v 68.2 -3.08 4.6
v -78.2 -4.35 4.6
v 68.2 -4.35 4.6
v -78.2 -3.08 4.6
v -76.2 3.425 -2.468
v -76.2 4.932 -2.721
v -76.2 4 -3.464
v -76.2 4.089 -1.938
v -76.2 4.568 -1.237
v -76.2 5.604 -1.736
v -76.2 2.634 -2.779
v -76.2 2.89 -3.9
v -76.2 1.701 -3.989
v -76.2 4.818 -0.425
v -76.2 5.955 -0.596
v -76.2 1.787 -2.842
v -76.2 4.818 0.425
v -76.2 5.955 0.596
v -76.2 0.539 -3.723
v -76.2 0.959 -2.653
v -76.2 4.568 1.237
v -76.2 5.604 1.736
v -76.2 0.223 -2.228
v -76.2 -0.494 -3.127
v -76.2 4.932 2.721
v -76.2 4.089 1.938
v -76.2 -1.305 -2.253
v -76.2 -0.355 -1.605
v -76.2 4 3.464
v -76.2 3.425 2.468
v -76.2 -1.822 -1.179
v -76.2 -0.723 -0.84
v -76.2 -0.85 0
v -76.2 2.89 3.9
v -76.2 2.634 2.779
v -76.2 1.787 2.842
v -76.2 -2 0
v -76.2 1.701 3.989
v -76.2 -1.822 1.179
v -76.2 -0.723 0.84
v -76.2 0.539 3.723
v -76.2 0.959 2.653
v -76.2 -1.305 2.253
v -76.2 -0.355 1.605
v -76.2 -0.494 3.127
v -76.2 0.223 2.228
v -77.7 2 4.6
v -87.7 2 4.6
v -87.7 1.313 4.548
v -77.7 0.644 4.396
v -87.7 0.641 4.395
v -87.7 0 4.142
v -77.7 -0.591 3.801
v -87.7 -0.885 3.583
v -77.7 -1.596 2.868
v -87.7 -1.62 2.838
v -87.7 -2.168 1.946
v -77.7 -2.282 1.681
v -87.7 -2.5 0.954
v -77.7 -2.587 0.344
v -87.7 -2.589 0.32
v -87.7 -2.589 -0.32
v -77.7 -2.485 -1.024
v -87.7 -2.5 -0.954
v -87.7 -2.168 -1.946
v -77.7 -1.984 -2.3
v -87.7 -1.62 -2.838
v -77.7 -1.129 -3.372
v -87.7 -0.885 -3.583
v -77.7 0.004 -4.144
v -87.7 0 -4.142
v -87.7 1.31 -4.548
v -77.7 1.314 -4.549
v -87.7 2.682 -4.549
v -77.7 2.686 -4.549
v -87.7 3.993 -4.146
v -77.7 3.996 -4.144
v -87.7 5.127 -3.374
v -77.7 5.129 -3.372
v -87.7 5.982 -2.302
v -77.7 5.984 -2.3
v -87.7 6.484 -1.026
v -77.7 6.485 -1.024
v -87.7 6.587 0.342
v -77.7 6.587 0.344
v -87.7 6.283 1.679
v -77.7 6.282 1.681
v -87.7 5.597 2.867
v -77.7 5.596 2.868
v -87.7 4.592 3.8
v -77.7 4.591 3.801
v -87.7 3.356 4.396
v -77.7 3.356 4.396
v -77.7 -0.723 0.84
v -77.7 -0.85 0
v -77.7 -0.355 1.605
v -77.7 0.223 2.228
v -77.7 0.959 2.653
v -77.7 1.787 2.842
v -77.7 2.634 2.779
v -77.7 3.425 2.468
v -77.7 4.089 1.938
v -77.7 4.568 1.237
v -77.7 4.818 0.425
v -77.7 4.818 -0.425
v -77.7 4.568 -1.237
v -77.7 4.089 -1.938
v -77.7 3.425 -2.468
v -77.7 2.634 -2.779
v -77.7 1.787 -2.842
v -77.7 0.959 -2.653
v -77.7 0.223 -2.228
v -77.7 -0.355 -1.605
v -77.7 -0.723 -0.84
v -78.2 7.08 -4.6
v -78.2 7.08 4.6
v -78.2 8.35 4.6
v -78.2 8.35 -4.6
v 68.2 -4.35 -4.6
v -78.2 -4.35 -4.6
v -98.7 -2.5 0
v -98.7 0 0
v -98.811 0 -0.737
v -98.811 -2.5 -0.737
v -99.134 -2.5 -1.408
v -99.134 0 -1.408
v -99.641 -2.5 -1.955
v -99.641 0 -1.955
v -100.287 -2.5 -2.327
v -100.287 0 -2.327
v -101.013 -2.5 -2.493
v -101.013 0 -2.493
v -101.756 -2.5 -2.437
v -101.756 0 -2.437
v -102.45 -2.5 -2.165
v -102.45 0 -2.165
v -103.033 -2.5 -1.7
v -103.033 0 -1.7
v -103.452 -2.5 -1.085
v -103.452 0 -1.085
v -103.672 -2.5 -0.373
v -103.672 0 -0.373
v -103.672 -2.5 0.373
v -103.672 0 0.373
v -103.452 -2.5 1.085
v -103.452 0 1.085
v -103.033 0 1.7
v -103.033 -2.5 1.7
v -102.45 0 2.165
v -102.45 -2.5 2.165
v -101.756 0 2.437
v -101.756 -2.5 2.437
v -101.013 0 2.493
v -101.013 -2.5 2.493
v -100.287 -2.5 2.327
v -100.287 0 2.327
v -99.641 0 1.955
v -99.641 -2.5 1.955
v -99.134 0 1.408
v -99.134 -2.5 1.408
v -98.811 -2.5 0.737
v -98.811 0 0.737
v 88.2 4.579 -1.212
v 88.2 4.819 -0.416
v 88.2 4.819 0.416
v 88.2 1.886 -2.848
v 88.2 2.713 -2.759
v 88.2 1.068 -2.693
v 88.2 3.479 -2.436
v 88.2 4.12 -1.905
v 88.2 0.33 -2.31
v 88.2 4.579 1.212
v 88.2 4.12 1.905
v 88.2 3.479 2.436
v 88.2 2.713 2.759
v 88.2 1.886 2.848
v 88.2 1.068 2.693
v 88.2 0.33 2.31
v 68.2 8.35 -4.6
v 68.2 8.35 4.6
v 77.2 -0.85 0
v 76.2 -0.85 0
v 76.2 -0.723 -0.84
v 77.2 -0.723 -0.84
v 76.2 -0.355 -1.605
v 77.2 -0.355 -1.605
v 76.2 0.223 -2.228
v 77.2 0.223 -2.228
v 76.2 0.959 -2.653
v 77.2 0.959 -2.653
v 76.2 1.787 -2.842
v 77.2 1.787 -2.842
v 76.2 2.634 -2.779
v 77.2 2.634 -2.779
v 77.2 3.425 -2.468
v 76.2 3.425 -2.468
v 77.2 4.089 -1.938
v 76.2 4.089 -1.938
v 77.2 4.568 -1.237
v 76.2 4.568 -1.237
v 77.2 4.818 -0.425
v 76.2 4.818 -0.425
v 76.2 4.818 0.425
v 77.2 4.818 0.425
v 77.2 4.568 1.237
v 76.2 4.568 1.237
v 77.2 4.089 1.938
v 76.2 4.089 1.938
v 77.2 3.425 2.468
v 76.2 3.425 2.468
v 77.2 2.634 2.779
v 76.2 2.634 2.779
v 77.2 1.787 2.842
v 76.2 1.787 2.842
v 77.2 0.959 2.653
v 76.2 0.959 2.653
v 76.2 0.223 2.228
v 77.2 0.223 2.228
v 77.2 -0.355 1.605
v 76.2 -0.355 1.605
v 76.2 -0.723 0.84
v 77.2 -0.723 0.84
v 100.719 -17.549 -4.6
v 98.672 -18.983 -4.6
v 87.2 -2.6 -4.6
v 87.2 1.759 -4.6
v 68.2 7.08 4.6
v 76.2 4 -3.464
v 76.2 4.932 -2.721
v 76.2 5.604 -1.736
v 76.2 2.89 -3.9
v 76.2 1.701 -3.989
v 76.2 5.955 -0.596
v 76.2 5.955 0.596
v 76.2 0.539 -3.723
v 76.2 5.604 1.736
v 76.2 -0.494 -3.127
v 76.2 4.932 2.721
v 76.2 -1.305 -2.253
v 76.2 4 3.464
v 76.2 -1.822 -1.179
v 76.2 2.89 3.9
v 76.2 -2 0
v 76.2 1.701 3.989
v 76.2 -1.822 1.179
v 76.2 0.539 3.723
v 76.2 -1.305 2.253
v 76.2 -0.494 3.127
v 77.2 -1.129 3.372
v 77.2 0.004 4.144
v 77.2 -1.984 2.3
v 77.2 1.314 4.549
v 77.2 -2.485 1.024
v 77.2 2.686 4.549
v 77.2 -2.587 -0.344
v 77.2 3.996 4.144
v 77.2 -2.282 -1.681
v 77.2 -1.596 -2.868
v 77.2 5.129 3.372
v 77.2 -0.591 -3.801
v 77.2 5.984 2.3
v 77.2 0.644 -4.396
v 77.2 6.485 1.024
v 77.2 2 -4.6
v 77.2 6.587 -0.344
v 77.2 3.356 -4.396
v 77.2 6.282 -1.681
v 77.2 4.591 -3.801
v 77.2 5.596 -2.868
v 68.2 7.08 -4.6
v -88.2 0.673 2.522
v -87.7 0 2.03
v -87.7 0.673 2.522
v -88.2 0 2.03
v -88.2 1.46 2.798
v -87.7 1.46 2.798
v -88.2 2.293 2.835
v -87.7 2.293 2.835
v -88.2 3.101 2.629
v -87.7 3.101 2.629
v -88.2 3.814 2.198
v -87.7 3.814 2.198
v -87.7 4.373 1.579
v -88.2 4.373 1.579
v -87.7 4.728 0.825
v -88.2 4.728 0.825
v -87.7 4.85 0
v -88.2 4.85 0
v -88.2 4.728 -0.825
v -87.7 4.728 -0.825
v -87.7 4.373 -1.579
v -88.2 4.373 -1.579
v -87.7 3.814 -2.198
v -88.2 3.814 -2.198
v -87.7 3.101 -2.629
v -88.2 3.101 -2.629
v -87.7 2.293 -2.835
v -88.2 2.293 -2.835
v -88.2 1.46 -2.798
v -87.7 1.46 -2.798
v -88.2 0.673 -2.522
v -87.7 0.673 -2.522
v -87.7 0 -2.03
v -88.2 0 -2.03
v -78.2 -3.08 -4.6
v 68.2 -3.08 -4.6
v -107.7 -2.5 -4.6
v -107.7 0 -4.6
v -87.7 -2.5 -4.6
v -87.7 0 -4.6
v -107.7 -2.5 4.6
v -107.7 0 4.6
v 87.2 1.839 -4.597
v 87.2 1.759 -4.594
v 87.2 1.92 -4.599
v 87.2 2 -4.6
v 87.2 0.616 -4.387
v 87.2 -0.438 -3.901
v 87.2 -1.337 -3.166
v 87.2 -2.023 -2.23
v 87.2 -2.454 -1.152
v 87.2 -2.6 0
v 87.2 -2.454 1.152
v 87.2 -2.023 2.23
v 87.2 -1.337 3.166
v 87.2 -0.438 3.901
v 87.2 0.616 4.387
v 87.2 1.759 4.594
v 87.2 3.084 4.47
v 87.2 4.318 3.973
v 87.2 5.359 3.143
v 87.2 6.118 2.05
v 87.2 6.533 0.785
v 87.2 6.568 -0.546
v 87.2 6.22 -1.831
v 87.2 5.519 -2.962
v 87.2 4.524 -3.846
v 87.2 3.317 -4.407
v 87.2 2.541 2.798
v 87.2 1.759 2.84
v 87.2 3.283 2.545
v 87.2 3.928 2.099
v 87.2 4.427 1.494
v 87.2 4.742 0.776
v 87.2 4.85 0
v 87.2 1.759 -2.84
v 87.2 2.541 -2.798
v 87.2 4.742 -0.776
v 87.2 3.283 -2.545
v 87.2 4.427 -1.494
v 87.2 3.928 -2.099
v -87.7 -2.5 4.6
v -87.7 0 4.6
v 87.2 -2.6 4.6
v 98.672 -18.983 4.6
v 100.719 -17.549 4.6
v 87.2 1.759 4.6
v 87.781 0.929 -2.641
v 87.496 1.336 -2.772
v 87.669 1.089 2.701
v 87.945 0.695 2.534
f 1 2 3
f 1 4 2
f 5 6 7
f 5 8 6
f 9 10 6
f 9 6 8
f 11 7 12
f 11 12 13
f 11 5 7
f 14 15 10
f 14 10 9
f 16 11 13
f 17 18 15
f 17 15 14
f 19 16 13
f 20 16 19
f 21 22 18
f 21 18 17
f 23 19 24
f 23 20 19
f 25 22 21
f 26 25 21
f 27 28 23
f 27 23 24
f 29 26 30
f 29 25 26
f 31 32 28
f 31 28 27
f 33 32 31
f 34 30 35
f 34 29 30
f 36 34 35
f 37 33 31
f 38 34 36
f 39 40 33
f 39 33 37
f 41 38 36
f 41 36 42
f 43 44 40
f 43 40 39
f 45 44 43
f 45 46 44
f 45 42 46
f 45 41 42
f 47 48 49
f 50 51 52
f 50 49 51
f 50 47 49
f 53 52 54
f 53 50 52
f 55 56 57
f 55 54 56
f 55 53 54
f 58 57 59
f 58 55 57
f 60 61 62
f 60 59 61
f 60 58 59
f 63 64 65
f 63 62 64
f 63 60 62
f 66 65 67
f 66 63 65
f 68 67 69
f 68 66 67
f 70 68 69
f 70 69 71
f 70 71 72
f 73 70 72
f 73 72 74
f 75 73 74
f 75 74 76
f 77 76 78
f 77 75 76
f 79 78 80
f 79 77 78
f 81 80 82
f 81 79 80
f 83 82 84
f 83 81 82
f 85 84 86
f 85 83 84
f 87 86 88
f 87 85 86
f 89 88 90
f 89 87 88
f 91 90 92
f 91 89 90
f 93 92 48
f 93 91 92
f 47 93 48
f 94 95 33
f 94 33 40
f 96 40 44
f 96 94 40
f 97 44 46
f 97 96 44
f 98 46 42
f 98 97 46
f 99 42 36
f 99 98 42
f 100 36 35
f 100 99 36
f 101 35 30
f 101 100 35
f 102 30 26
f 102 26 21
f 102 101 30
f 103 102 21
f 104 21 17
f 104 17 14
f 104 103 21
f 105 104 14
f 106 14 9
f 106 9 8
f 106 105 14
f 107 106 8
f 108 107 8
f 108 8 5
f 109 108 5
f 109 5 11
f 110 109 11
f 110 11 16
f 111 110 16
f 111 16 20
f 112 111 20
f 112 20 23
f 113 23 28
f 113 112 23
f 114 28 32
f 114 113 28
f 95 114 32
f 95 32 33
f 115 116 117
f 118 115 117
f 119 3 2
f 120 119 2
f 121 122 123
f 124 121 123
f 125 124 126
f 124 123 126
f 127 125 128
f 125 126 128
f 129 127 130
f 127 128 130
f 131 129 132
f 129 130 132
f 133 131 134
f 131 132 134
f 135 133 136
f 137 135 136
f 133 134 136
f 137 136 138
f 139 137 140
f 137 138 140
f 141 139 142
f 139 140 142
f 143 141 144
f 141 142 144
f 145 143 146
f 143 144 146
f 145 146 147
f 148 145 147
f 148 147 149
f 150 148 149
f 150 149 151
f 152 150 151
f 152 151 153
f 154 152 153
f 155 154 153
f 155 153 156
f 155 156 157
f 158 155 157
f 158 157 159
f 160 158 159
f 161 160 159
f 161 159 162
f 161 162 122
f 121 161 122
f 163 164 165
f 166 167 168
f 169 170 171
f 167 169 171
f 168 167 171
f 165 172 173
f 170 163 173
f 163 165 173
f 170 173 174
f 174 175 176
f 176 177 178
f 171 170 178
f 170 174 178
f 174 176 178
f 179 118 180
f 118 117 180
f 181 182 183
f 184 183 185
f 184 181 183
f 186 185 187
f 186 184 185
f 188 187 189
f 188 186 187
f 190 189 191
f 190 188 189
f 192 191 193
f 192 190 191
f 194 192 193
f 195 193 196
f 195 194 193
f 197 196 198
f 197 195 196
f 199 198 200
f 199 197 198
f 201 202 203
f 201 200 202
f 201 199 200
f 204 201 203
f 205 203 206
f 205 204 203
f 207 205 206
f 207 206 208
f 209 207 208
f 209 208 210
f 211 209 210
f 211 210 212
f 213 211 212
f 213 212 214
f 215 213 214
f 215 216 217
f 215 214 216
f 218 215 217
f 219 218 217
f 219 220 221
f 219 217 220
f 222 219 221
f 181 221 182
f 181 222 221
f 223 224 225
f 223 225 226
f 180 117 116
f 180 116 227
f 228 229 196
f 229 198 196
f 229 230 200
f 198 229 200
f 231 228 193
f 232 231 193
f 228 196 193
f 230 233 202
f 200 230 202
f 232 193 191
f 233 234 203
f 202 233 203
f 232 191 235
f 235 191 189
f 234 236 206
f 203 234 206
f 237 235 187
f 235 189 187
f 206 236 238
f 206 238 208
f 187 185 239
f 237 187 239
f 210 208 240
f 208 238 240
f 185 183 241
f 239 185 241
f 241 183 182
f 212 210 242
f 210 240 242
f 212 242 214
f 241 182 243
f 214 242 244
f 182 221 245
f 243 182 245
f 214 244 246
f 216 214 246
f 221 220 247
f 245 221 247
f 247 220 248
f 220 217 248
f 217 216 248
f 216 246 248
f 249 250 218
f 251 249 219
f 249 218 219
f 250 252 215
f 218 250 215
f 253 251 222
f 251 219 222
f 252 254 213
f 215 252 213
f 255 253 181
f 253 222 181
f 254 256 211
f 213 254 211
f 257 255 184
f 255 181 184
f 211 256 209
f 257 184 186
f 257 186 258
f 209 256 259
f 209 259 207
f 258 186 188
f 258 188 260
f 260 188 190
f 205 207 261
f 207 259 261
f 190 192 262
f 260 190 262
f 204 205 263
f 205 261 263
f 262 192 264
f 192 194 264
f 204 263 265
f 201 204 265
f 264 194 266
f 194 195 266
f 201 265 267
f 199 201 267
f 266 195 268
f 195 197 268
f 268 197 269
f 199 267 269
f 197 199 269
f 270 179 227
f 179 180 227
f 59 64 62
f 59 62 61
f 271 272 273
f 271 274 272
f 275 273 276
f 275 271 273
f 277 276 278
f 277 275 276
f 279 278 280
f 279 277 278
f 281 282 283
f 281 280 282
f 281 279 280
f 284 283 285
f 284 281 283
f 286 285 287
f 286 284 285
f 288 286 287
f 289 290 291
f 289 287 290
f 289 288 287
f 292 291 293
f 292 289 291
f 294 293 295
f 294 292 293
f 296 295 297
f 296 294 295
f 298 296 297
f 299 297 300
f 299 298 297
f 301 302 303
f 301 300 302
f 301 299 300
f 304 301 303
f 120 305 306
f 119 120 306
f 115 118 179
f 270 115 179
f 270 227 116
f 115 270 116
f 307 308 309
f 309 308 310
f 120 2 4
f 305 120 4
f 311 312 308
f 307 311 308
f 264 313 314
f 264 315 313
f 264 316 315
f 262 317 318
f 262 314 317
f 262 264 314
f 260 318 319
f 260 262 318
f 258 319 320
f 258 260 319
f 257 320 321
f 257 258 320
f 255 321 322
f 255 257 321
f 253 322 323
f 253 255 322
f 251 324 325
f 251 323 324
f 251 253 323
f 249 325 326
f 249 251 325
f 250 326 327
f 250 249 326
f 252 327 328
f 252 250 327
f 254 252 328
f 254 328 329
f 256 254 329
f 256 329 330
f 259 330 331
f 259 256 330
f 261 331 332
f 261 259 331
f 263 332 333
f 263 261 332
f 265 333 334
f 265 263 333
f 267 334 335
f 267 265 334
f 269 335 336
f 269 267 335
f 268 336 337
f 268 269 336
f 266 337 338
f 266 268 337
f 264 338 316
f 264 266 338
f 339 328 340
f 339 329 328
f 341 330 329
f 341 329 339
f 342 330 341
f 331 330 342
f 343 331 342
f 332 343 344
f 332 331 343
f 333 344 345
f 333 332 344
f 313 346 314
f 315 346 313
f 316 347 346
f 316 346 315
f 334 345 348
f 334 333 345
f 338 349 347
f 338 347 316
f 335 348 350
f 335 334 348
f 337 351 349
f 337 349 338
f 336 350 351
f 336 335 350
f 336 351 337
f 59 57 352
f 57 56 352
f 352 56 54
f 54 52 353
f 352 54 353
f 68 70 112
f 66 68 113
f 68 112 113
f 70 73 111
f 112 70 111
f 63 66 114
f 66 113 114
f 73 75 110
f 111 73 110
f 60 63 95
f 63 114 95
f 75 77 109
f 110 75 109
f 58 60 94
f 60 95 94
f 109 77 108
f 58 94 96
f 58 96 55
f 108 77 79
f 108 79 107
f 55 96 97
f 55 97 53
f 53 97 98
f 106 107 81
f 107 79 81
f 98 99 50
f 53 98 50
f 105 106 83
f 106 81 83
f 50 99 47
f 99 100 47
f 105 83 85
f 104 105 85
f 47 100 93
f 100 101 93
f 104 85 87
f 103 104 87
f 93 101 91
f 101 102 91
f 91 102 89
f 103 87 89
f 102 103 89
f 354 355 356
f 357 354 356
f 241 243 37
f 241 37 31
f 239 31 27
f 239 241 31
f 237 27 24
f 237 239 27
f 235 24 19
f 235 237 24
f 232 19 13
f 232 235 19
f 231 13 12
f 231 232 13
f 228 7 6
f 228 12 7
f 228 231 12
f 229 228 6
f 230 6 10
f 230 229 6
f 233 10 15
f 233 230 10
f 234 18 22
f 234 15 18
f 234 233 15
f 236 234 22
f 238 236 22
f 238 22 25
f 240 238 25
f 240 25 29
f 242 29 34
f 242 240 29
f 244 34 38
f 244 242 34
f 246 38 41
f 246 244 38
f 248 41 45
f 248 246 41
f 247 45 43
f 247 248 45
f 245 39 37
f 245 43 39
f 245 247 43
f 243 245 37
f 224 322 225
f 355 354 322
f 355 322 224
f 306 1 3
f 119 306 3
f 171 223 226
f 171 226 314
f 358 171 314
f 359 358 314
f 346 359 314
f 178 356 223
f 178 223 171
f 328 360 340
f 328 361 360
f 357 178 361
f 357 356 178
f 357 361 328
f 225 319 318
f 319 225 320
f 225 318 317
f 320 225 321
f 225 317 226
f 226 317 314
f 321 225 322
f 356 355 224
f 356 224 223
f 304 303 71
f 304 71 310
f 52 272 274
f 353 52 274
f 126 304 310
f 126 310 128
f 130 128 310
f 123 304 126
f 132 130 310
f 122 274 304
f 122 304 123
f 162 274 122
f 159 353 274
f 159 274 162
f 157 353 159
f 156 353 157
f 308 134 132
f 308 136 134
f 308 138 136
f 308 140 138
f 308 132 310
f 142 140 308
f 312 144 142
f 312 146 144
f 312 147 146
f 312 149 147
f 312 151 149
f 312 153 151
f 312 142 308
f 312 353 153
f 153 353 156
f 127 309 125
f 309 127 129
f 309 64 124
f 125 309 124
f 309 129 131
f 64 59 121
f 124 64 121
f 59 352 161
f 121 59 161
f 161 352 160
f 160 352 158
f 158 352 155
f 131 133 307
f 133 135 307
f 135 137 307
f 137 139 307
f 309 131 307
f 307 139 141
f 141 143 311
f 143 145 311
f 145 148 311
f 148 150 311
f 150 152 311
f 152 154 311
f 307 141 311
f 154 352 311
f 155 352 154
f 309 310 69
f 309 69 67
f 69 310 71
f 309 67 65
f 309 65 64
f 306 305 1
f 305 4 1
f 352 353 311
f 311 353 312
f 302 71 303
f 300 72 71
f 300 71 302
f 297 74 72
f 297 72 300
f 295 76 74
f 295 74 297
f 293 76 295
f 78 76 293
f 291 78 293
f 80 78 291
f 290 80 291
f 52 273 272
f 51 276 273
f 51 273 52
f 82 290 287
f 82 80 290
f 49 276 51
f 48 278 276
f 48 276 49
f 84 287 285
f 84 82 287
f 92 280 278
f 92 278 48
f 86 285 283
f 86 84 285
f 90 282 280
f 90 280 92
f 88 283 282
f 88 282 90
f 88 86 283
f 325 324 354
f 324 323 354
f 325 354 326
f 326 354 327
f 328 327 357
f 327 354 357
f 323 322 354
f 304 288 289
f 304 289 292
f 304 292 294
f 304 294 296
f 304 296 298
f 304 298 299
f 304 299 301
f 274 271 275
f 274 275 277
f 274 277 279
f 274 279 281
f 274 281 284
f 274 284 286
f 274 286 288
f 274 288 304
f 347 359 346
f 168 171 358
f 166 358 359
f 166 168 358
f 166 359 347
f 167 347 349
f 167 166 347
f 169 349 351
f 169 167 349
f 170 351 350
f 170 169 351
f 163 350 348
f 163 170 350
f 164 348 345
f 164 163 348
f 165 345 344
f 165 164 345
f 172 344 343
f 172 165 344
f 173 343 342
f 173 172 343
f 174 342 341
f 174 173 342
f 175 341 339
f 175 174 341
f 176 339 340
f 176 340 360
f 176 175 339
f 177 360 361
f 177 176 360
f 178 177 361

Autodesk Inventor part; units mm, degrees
ref_plane "YZ Plane" through (0, 0, 0) normal (1, 0, 0) x (0, 1, 0)
sketch "Sketch1" plane through (0, 0, 0) normal (0, 0, 1) x (1, 0, 0)
  line L0 (-76.2, -2) -> (76.2, -2)
  line L1 (76.2, 2) -> (-76.2, 2)
  line L2 (-76.2, -2) -> (76.2, 2) construction
  line L3 (76.2, -2) -> (-76.2, 2) construction
  line L4 (-76.2, -2) -> (-76.2, -0.85)
  line L5 (-76.2, -0.85) -> (-88.2, -0.85)
  line L6 (-88.2, -0.85) -> (-88.2, 2)
  line L7 (-88.2, 2) -> (-76.2, 2)
  line L8 (76.2, -2) -> (76.2, -0.85)
  line L9 (76.2, -0.85) -> (88.2, -0.85)
  line L10 (88.2, -0.85) -> (88.2, 2)
  line L11 (88.2, 2) -> (76.2, 2)
  point P0 (0, 0)
  point P1 (0, 0)
  point P2 (0, 0)
  dimension "d3" = 4
  dimension "d4" = 2.85
  dimension "d5" = 12
  dimension "d6" = 152.4
revolve "Revolution1" add sketch "Sketch1" angle 360 about axis through (76.2, 2, 0) along (-1, 0, 0)
ref_plane "Work Plane1" through (-77.7, 2, 0) normal (-1, 0, 0) x (0, 0, 1)
sketch "Sketch2" plane through (-77.7, 2, 0) normal (-1, 0, 0) x (0, 0, 1)
  circle A0 centre (0, 0) radius 2.85 projected
  circle A1 centre (0, 0) radius 4.6
  point P0 (0, -2)
  dimension "d9" = 9.2
extrude "Extrusion1" add sketch "Sketch2" along normal blind 10
ref_plane "Work Plane2" through (77.2, 2, 0) normal (1, 0, 0) x (0, 0, -1)
sketch "Sketch3" plane through (77.2, 2, 0) normal (1, 0, 0) x (0, 0, -1)
  circle A0 centre (0, 0) radius 4.6 projected
  point P0 (0, -2)
extrude "Extrusion2" add sketch "Sketch3" along normal blind 10
sketch "Sketch4" plane through (0, 0, 0) normal (0, 1, 0) x (-1, 0, 0)
  line L0 (87.7, -4.6) -> (87.7, 4.6) projected
  line L1 (-87.2, 4.6) -> (-87.2, -4.6) projected
  line L2 (87.7, 4.6) -> (107.7, 4.6)
  line L3 (107.7, 4.6) -> (107.7, -4.6)
  line L4 (107.7, -4.6) -> (87.7, -4.6)
  point P0 (0, 0)
  dimension "d15" = 20
extrude "Extrusion3" add sketch "Sketch4" against normal blind 2.5
sketch "Sketch5" plane through (-107.7, 0, 4.6) normal (0, 0, 1) x (1, 0, 0)
  line L0 (194.9, -2.6) -> (194.9, 6.6) projected
  line L1 (194.9, -2.6) -> (206.3715, -18.983)
  line L2 (206.3715, -18.983) -> (208.4194, -17.5491)
  line L3 (208.4194, -17.5491) -> (194.9, 1.7586)
  line L4 (0, 0) -> (0, -2.5) construction
  line L5 (20, -2.5) -> (0, -2.5) construction
  point P0 (107.7, 0)
  dimension "d18" = 145
extrude "Extrusion4" add sketch "Sketch5" against normal up to surface (9.2 mm away)
sketch "Sketch6" plane through (-107.7, 0, 4.6) normal (0, 0, 1) x (1, 0, 0)
  line L0 (30, 6.6) -> (20, 6.6) construction
  line L1 (30, -2.6) -> (20, -2.6) construction
  line L2 (19.5, 4.85) -> (19.5, 0) construction
  line L3 (195.9, 4.85) -> (195.9, 0.3305) construction
  line L4 (29.5, 8.35) -> (175.9, 8.35)
  line L5 (175.9, 8.35) -> (175.9, 7.08)
  line L6 (175.9, 7.08) -> (29.5, 7.08)
  line L7 (29.5, 7.08) -> (29.5, 8.35)
  line L8 (29.5, -3.08) -> (175.9, -3.08)
  line L9 (175.9, -3.08) -> (175.9, -4.35)
  line L10 (175.9, -4.35) -> (29.5, -4.35)
  line L11 (29.5, -4.35) -> (29.5, -3.08)
  line L12 (25, -2.6) -> (25, -3.08) construction
  line L13 (25, 6.6) -> (25, 7.08) construction
  point P0 (107.7, 0)
  dimension "d21" = 12.7
  dimension "d22" = 1.27
  dimension "d23" = 20
  dimension "d26" = 10
extrude "Extrusion5" add sketch "Sketch6" against normal up to surface (9.2 mm away)
sketch "Sketch7" plane through (0, 0, 0) normal (0, 1, 0) x (1, 0, 0)
  line L0 (-88.2, 2.0304) -> (-88.2, -2.0304) construction
  line L1 (-88.2, 0) -> (-101.2, 0) construction
  circle A0 centre (-101.2, 0) radius 2.5
  point P0 (0, 0)
  dimension "d27" = 5
  dimension "d28" = 13
extrude "Extrusion6" cut sketch "Sketch7" against normal up to surface (2.5 mm away)
properties part number "Cable Primitive"
